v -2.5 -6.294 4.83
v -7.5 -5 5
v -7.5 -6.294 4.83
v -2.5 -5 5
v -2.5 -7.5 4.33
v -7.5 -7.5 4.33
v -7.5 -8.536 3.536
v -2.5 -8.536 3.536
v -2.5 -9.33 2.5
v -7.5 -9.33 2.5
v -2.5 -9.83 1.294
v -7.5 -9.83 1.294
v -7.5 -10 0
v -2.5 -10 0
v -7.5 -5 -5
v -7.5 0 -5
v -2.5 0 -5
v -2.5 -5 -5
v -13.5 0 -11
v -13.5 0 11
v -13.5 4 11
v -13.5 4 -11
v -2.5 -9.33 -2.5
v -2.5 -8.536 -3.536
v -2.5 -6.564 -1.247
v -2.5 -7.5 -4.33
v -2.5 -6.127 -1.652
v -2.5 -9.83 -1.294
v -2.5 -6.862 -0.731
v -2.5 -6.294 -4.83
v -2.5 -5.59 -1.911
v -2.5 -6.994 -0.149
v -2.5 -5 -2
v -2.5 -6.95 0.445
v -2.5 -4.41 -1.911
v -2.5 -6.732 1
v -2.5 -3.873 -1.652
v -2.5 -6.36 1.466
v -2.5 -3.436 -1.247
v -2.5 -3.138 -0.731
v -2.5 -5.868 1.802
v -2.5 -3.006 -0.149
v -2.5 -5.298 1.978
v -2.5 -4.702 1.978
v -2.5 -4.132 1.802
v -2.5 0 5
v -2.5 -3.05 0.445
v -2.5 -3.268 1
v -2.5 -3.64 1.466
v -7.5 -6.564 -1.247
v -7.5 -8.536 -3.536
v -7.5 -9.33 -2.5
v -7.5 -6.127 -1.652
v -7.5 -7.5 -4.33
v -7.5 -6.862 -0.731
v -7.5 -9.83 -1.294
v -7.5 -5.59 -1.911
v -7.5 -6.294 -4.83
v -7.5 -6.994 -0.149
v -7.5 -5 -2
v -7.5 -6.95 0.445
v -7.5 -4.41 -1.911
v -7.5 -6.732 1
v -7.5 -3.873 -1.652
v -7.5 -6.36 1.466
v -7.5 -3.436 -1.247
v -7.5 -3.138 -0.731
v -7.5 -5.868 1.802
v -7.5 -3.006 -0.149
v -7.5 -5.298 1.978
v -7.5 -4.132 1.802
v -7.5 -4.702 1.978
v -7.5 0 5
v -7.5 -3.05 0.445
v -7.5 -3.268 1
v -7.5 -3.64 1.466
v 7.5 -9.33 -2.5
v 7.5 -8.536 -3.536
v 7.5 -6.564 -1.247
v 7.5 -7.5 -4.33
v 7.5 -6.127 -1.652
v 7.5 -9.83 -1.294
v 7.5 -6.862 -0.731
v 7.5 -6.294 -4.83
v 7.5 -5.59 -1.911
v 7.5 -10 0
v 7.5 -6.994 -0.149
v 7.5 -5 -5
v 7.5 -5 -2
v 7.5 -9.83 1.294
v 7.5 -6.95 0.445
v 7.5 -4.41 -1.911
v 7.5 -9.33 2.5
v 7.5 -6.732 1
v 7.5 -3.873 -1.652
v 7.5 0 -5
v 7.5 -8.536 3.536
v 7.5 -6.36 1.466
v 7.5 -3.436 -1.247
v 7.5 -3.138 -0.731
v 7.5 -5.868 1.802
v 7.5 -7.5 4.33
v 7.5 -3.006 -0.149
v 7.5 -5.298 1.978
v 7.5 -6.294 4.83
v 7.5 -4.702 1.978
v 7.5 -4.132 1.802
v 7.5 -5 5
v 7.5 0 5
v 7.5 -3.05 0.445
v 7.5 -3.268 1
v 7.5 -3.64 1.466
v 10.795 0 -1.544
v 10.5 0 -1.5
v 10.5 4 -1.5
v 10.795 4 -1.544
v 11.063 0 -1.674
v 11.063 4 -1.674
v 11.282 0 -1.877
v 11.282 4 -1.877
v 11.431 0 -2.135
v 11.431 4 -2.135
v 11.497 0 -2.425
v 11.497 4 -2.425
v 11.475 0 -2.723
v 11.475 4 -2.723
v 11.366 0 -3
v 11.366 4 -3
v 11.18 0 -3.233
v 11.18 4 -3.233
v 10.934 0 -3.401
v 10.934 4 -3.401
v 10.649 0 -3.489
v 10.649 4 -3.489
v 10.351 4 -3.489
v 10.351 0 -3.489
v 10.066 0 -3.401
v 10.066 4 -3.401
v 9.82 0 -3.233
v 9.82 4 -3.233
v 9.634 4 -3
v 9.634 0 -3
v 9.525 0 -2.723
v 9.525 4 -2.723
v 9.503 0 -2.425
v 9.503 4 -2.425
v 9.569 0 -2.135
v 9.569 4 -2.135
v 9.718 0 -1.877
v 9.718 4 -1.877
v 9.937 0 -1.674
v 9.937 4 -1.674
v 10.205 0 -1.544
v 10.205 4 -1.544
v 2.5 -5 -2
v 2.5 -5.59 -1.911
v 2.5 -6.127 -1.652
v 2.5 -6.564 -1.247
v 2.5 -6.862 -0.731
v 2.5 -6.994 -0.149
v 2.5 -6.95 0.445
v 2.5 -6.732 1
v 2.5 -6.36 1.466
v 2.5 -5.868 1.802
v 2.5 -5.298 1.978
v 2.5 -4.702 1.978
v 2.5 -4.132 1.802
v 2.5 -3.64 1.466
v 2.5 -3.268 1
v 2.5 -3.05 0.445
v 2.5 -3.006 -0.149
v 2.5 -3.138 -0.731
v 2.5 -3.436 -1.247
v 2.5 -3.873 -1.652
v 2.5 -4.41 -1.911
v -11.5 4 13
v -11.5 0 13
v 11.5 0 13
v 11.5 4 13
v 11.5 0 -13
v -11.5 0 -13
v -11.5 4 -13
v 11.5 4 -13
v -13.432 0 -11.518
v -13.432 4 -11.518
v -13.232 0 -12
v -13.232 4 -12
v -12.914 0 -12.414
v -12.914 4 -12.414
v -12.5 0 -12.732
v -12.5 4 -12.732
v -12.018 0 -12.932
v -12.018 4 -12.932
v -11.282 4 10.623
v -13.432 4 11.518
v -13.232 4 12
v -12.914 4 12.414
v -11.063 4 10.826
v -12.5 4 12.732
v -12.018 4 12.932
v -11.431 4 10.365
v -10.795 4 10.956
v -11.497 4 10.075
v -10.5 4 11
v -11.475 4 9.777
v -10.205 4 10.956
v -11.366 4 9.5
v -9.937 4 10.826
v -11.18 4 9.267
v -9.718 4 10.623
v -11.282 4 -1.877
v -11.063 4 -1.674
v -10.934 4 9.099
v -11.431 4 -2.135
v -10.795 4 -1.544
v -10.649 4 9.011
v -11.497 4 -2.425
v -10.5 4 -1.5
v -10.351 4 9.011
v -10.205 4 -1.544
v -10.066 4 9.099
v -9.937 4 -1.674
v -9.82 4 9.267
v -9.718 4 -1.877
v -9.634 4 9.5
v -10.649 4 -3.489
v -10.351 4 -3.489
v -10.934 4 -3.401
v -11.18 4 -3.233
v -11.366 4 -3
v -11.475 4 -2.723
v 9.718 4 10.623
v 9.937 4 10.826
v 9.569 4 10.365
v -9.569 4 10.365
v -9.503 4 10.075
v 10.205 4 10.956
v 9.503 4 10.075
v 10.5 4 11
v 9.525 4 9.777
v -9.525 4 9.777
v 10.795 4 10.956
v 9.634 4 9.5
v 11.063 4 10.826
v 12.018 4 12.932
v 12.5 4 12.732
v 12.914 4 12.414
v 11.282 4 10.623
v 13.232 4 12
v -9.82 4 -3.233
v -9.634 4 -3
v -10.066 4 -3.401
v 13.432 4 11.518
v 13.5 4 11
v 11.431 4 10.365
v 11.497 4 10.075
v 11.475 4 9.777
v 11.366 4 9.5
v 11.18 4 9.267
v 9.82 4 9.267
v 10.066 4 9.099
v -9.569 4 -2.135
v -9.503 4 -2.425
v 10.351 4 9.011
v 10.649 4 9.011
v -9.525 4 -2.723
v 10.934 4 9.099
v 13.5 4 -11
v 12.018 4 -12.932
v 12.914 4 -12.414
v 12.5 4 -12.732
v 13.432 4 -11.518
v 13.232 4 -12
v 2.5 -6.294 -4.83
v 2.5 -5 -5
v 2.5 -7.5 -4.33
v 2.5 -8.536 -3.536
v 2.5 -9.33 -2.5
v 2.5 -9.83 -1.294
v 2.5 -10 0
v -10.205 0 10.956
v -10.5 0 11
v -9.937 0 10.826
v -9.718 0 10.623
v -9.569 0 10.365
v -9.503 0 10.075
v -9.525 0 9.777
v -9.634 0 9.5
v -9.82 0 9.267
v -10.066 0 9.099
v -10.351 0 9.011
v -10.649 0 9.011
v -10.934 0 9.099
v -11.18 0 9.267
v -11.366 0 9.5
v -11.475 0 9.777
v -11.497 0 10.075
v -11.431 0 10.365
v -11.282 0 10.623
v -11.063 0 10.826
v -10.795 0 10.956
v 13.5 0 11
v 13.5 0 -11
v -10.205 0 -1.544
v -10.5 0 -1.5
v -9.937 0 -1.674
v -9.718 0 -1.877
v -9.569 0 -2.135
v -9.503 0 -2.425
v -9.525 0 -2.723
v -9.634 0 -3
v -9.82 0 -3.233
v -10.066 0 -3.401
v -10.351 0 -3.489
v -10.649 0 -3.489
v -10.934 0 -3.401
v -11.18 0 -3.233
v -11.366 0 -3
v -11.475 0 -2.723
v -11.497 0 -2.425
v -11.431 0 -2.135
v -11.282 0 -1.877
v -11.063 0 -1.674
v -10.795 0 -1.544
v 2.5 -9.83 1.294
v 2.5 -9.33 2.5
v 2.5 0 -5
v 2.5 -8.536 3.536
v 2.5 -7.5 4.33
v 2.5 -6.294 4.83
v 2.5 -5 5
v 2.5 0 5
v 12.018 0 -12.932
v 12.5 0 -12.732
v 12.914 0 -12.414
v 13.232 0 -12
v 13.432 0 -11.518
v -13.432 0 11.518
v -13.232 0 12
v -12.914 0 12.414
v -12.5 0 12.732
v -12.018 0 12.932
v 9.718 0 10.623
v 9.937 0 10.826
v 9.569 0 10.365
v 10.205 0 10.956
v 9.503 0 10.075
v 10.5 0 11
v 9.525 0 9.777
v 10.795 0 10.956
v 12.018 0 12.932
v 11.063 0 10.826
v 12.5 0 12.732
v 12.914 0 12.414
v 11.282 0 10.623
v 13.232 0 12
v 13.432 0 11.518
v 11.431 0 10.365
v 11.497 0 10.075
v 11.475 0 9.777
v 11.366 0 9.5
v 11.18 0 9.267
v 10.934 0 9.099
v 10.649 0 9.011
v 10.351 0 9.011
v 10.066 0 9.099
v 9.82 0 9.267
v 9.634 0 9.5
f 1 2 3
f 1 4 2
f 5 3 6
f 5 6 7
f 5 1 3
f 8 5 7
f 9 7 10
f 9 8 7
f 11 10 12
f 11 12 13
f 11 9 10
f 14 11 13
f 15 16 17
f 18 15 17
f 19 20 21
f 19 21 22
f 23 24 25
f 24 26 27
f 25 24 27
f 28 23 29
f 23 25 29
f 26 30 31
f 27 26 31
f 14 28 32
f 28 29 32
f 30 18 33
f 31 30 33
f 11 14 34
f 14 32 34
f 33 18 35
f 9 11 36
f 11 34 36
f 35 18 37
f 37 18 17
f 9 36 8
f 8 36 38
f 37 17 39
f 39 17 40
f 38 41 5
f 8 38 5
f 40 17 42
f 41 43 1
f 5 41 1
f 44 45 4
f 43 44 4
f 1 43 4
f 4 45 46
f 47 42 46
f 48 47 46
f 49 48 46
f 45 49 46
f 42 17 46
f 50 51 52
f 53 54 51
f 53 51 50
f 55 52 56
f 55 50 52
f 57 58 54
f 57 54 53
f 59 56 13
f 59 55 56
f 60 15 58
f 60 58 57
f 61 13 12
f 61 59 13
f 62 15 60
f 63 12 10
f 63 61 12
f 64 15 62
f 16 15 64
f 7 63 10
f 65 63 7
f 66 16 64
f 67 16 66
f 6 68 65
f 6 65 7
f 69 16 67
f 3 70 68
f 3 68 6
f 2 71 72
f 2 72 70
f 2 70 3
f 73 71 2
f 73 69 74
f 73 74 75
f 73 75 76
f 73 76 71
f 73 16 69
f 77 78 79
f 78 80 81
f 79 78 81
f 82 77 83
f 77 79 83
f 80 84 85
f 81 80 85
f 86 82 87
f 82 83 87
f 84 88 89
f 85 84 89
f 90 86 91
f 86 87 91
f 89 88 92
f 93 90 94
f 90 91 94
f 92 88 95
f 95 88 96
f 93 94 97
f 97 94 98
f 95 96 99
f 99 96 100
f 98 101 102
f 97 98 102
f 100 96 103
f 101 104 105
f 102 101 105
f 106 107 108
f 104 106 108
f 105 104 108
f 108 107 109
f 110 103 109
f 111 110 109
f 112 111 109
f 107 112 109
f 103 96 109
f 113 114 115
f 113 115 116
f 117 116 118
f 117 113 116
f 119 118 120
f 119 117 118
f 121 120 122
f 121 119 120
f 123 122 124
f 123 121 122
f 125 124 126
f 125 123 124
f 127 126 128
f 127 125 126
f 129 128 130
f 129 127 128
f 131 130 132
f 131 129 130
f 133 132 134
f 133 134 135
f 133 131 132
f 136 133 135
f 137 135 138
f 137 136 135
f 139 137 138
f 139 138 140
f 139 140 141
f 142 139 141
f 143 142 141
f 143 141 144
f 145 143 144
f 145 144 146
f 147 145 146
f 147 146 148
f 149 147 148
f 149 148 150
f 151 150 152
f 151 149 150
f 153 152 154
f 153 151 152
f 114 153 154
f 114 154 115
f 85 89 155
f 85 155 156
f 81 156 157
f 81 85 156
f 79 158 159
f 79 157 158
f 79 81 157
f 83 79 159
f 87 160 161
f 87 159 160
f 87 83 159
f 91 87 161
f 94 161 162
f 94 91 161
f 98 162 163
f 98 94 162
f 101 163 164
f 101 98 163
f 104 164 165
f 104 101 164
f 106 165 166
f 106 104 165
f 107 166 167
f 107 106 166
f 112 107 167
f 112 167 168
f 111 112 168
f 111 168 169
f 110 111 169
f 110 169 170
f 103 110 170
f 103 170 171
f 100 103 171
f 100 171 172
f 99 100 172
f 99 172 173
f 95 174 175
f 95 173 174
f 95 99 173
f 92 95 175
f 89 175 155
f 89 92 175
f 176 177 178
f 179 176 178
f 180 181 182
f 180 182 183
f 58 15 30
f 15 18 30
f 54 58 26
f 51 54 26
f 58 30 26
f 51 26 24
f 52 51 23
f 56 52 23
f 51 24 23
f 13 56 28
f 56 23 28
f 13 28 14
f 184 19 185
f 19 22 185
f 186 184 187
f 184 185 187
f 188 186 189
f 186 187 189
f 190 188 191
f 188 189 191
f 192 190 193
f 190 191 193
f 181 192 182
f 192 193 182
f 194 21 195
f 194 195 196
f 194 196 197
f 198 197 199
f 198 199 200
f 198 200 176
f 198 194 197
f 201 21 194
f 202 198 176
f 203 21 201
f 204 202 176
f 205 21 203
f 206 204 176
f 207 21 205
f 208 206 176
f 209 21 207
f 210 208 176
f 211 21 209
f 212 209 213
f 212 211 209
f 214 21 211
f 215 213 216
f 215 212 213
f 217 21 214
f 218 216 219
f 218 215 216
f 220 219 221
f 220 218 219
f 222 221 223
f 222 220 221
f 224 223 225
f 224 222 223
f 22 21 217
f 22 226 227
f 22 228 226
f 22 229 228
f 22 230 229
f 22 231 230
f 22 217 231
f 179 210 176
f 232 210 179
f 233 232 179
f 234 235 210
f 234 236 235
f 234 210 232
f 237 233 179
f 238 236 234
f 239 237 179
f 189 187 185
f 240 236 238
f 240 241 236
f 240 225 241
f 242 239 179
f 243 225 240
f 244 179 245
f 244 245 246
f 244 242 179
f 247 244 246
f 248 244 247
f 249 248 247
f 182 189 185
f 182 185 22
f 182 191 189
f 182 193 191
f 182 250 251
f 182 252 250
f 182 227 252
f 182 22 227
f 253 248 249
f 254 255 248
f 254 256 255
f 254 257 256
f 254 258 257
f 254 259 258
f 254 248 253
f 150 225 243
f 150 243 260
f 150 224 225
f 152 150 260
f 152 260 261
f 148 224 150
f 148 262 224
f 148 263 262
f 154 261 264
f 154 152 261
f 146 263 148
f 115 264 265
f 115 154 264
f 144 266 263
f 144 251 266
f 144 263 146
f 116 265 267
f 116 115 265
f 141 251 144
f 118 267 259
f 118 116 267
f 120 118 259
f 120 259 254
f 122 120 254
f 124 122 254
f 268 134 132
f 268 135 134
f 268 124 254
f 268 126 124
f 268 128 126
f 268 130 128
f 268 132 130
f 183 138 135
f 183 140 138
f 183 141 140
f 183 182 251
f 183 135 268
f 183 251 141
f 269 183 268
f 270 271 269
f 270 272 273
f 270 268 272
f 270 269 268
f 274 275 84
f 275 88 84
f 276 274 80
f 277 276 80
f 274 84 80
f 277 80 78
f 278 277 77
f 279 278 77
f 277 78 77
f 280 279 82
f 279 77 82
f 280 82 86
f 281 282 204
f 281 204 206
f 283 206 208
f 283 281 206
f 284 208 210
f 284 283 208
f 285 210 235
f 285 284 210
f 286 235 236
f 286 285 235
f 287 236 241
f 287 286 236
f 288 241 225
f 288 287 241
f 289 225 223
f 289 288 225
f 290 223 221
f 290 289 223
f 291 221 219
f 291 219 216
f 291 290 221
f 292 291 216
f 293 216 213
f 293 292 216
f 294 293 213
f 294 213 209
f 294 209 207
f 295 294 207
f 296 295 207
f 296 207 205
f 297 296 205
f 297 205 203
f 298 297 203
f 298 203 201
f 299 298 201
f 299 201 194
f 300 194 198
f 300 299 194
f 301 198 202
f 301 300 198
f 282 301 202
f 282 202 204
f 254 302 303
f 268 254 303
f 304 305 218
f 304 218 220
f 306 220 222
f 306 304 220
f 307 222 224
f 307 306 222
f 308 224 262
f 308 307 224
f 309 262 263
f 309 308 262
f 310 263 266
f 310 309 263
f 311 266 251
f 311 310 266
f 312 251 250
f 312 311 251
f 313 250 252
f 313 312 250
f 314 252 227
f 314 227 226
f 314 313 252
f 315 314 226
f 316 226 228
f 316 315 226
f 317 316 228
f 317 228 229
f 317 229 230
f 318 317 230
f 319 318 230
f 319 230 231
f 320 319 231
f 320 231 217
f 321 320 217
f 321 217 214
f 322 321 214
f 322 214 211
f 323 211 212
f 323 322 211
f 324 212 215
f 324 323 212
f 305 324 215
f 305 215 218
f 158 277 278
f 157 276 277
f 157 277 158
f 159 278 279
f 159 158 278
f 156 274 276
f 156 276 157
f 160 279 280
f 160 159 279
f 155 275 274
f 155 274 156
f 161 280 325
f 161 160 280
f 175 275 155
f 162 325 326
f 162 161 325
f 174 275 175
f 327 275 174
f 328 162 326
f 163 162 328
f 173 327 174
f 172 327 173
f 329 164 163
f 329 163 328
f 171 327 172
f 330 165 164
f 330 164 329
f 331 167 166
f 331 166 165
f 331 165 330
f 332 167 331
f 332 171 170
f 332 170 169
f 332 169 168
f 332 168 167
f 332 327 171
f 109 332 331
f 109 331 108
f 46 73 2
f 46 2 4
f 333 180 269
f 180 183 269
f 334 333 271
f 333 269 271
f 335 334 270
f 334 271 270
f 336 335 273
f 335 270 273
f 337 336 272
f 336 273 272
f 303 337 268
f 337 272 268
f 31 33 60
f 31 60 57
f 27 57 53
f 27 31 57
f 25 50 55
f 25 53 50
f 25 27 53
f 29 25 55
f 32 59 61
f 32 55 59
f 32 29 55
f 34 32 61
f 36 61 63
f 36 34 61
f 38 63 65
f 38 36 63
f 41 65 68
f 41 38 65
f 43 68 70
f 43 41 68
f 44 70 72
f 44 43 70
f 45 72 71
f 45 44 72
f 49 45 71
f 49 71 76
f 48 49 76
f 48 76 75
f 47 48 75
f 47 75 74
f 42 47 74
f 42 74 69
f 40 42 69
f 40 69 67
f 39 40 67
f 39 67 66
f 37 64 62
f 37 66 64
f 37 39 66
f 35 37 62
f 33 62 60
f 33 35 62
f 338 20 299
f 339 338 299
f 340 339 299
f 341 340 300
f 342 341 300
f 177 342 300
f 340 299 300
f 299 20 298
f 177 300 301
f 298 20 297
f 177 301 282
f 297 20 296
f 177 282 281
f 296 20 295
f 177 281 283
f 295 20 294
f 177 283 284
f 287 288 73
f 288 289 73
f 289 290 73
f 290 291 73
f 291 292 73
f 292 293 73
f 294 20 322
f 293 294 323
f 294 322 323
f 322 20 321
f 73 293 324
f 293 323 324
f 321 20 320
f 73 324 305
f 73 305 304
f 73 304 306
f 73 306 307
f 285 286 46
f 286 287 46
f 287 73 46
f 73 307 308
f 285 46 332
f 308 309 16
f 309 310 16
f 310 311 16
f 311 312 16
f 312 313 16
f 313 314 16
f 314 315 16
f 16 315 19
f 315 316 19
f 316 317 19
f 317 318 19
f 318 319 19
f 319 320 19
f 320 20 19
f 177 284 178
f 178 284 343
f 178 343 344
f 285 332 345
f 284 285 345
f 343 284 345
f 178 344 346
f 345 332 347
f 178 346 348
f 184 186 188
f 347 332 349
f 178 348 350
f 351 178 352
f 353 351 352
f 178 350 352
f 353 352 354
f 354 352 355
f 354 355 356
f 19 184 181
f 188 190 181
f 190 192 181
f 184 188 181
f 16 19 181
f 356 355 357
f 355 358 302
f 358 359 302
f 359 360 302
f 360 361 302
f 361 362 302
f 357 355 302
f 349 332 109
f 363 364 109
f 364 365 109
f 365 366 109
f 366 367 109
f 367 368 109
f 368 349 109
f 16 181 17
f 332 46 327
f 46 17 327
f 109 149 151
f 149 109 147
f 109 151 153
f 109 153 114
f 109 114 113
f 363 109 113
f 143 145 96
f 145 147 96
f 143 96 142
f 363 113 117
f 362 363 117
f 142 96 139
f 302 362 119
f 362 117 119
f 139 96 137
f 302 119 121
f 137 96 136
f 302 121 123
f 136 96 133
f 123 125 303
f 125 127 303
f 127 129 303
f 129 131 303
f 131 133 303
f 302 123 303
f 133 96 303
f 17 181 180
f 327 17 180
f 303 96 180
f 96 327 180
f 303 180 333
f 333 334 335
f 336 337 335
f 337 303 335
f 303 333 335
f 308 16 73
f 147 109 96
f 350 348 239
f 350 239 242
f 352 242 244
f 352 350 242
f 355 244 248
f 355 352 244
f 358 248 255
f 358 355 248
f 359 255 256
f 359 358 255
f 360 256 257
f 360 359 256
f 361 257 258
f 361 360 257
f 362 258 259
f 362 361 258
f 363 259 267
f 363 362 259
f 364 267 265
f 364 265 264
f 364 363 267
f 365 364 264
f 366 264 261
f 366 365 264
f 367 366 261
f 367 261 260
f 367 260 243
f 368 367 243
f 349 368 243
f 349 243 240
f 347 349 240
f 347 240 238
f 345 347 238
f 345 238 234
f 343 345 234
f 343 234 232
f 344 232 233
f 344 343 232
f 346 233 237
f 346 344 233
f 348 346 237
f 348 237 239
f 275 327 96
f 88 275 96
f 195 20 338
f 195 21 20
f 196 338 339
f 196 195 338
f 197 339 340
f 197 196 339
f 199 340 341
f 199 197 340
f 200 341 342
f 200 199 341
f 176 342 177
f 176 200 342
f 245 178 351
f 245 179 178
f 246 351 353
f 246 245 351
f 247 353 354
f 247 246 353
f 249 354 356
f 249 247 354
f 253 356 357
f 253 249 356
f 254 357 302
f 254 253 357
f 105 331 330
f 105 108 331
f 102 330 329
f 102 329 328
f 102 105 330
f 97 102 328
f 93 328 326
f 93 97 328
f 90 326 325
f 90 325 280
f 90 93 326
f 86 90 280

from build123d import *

# Parameters (mm, degrees)
SKETCH1_W               = 27
SKETCH1_H               = 26
SKETCH1_R               = 1
BOSS_EXTRUDE1_DEPTH     = 4
SKETCH2_W               = 5
SKETCH2_H               = 10
BOSS_EXTRUDE2_DEPTH     = 10
FILLET1_R               = 5
CUT_EXTRUDE1_DEPTH      = 11
CUT_EXTRUDE1_DEPTH_BACK = 22
SKETCH4_R               = 2
FILLET2_R               = 2


with BuildPart() as part:
    # Sketch1 → Boss-Extrude1 (new body)
    with BuildSketch(Plane(origin=(0, 0, 0), x_dir=(1, 0, 0), z_dir=(0, 1, 0))):
        Rectangle(SKETCH1_W, SKETCH1_H)
        with Locations(Location((-10.5, 2.5, 0), (0, 0, 270))):
            Circle(SKETCH1_R, mode=Mode.SUBTRACT)
        with Locations(Location((-10.5, -10, 0), (0, 0, 270))):
            Circle(SKETCH1_R, mode=Mode.SUBTRACT)
        with Locations(Location((10.5, -10, 0), (0, 0, 270))):
            Circle(SKETCH1_R, mode=Mode.SUBTRACT)
        with Locations(Location((10.5, 2.5, 0), (0, 0, 270))):
            Circle(SKETCH1_R, mode=Mode.SUBTRACT)
    extrude(amount=BOSS_EXTRUDE1_DEPTH)

    # Sketch2 → Boss-Extrude2 (add)
    with BuildSketch(Plane.XZ):
        with Locations((-5, 0)):
            Rectangle(SKETCH2_W, SKETCH2_H)
        with Locations((5, 0)):
            Rectangle(SKETCH2_W, SKETCH2_H)
    extrude(amount=BOSS_EXTRUDE2_DEPTH)

    # Fillet1
    fillet1_edges = [part.edges().sort_by_distance(p)[0] for p in [
        (5, -10, 5),
        (5, -10, -5),
        (-5, -10, 5),
        (-5, -10, -5),
    ]]
    fillet(fillet1_edges, radius=FILLET1_R - 0.0001)  # a hair under: the kernel refuses the full size

    # Sketch4 → Cut-Extrude1 (cut, two sides: drawn at the far end of the back side and taken through both)
    with BuildSketch(Plane.ZY.offset(7.5).offset(-CUT_EXTRUDE1_DEPTH_BACK)):
        with Locations(Location((0, -5, 0), (0, 0, 180))):
            Circle(SKETCH4_R)
    extrude(amount=CUT_EXTRUDE1_DEPTH + CUT_EXTRUDE1_DEPTH_BACK, mode=Mode.SUBTRACT)

    # Fillet2
    fillet2_edges = [part.edges().sort_by_distance(p)[0] for p in [
        (-13.5, 2, 13),
        (-13.5, 2, -13),
        (13.5, 2, -13),
        (13.5, 2, 13),
    ]]
    fillet(fillet2_edges, radius=FILLET2_R)


solid = part.part
